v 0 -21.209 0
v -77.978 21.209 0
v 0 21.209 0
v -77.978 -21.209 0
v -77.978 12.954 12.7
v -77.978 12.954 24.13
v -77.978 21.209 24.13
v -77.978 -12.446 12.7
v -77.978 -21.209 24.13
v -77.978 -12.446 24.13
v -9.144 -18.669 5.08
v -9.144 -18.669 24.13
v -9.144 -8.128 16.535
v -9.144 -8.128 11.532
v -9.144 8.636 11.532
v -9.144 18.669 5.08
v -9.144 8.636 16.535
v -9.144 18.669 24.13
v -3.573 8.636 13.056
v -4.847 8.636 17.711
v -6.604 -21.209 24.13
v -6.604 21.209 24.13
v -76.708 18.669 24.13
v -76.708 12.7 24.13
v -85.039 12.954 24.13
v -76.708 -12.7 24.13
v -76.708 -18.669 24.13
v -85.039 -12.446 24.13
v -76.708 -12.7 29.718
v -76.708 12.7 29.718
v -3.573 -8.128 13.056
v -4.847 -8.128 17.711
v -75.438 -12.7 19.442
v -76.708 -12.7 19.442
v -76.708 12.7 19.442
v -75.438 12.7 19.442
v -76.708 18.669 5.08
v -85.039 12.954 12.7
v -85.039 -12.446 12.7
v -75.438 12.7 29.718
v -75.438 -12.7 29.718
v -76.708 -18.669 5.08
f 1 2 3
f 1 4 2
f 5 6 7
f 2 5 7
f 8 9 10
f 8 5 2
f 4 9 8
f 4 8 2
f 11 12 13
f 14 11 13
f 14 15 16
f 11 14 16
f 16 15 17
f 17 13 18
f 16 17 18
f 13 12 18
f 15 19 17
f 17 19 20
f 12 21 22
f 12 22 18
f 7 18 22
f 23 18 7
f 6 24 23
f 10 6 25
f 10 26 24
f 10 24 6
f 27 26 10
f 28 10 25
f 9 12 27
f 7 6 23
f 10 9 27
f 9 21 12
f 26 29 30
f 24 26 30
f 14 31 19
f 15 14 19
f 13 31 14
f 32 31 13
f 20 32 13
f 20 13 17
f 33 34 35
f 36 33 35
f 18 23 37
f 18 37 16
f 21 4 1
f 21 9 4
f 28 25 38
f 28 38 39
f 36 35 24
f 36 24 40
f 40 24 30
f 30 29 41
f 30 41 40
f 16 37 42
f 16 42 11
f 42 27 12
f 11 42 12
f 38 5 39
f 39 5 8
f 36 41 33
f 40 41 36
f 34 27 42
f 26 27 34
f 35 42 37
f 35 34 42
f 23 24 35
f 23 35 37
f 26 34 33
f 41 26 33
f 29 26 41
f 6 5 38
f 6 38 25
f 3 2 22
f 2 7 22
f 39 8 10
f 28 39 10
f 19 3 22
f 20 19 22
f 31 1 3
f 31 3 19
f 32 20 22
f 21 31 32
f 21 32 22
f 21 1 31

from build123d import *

# Parameters (mm, degrees)
F1_DEPTH = 21.209
F2_W     = 25.4
F2_H     = 11.43
F3_DEPTH = 7.0612
F4_W     = 16.764
F4_H     = 4.826
F5_DEPTH = 7.366
F6_W     = 67.564
F6_H     = 37.338
F7_DEPTH = 19.05
F8_W     = 25.4
F8_H     = 10.276243
F9_DEPTH = 1.27


with BuildPart() as f1:
    # F0 (on Front) → F1 (new body, symmetric)
    with BuildSketch(Plane.XZ):
        Polygon((-77.978, 0), (0, 0), (-6.604, 24.13), (-77.978, 24.13), align=None)
    extrude(amount=F1_DEPTH, both=True)

    # F2 (on face) → F3 (join)
    with BuildSketch(Plane(origin=(-77.978, 0, 0), x_dir=(0, -1, 0), z_dir=(-1, 0, 0))):
        with Locations((-0.254, 18.415)):
            Rectangle(F2_W, F2_H)
    extrude(amount=F3_DEPTH)

    # F4 (on face) → F5 (cut)
    with BuildSketch(Plane(origin=(0, 0, 0), x_dir=(0, 1, 0), z_dir=(0.964529, 0, 0.263976))):
        with Locations((0.254, 15.949588)):
            Rectangle(F4_W, F4_H)
    extrude(amount=-F5_DEPTH, mode=Mode.SUBTRACT)

    # F6 (on face) → F7 (cut)
    with BuildSketch(Plane.XY.offset(24.13)):
        with Locations((-42.926, 0)):
            Rectangle(F6_W, F6_H)
    extrude(amount=-F7_DEPTH, mode=Mode.SUBTRACT)

    # F8 (on face) → F9 (join)
    with BuildSketch(Plane.YZ.offset(-76.708)):
        with Locations((0, 24.579878)):
            Rectangle(F8_W, F8_H)
    extrude(amount=F9_DEPTH)


solid = f1.part
